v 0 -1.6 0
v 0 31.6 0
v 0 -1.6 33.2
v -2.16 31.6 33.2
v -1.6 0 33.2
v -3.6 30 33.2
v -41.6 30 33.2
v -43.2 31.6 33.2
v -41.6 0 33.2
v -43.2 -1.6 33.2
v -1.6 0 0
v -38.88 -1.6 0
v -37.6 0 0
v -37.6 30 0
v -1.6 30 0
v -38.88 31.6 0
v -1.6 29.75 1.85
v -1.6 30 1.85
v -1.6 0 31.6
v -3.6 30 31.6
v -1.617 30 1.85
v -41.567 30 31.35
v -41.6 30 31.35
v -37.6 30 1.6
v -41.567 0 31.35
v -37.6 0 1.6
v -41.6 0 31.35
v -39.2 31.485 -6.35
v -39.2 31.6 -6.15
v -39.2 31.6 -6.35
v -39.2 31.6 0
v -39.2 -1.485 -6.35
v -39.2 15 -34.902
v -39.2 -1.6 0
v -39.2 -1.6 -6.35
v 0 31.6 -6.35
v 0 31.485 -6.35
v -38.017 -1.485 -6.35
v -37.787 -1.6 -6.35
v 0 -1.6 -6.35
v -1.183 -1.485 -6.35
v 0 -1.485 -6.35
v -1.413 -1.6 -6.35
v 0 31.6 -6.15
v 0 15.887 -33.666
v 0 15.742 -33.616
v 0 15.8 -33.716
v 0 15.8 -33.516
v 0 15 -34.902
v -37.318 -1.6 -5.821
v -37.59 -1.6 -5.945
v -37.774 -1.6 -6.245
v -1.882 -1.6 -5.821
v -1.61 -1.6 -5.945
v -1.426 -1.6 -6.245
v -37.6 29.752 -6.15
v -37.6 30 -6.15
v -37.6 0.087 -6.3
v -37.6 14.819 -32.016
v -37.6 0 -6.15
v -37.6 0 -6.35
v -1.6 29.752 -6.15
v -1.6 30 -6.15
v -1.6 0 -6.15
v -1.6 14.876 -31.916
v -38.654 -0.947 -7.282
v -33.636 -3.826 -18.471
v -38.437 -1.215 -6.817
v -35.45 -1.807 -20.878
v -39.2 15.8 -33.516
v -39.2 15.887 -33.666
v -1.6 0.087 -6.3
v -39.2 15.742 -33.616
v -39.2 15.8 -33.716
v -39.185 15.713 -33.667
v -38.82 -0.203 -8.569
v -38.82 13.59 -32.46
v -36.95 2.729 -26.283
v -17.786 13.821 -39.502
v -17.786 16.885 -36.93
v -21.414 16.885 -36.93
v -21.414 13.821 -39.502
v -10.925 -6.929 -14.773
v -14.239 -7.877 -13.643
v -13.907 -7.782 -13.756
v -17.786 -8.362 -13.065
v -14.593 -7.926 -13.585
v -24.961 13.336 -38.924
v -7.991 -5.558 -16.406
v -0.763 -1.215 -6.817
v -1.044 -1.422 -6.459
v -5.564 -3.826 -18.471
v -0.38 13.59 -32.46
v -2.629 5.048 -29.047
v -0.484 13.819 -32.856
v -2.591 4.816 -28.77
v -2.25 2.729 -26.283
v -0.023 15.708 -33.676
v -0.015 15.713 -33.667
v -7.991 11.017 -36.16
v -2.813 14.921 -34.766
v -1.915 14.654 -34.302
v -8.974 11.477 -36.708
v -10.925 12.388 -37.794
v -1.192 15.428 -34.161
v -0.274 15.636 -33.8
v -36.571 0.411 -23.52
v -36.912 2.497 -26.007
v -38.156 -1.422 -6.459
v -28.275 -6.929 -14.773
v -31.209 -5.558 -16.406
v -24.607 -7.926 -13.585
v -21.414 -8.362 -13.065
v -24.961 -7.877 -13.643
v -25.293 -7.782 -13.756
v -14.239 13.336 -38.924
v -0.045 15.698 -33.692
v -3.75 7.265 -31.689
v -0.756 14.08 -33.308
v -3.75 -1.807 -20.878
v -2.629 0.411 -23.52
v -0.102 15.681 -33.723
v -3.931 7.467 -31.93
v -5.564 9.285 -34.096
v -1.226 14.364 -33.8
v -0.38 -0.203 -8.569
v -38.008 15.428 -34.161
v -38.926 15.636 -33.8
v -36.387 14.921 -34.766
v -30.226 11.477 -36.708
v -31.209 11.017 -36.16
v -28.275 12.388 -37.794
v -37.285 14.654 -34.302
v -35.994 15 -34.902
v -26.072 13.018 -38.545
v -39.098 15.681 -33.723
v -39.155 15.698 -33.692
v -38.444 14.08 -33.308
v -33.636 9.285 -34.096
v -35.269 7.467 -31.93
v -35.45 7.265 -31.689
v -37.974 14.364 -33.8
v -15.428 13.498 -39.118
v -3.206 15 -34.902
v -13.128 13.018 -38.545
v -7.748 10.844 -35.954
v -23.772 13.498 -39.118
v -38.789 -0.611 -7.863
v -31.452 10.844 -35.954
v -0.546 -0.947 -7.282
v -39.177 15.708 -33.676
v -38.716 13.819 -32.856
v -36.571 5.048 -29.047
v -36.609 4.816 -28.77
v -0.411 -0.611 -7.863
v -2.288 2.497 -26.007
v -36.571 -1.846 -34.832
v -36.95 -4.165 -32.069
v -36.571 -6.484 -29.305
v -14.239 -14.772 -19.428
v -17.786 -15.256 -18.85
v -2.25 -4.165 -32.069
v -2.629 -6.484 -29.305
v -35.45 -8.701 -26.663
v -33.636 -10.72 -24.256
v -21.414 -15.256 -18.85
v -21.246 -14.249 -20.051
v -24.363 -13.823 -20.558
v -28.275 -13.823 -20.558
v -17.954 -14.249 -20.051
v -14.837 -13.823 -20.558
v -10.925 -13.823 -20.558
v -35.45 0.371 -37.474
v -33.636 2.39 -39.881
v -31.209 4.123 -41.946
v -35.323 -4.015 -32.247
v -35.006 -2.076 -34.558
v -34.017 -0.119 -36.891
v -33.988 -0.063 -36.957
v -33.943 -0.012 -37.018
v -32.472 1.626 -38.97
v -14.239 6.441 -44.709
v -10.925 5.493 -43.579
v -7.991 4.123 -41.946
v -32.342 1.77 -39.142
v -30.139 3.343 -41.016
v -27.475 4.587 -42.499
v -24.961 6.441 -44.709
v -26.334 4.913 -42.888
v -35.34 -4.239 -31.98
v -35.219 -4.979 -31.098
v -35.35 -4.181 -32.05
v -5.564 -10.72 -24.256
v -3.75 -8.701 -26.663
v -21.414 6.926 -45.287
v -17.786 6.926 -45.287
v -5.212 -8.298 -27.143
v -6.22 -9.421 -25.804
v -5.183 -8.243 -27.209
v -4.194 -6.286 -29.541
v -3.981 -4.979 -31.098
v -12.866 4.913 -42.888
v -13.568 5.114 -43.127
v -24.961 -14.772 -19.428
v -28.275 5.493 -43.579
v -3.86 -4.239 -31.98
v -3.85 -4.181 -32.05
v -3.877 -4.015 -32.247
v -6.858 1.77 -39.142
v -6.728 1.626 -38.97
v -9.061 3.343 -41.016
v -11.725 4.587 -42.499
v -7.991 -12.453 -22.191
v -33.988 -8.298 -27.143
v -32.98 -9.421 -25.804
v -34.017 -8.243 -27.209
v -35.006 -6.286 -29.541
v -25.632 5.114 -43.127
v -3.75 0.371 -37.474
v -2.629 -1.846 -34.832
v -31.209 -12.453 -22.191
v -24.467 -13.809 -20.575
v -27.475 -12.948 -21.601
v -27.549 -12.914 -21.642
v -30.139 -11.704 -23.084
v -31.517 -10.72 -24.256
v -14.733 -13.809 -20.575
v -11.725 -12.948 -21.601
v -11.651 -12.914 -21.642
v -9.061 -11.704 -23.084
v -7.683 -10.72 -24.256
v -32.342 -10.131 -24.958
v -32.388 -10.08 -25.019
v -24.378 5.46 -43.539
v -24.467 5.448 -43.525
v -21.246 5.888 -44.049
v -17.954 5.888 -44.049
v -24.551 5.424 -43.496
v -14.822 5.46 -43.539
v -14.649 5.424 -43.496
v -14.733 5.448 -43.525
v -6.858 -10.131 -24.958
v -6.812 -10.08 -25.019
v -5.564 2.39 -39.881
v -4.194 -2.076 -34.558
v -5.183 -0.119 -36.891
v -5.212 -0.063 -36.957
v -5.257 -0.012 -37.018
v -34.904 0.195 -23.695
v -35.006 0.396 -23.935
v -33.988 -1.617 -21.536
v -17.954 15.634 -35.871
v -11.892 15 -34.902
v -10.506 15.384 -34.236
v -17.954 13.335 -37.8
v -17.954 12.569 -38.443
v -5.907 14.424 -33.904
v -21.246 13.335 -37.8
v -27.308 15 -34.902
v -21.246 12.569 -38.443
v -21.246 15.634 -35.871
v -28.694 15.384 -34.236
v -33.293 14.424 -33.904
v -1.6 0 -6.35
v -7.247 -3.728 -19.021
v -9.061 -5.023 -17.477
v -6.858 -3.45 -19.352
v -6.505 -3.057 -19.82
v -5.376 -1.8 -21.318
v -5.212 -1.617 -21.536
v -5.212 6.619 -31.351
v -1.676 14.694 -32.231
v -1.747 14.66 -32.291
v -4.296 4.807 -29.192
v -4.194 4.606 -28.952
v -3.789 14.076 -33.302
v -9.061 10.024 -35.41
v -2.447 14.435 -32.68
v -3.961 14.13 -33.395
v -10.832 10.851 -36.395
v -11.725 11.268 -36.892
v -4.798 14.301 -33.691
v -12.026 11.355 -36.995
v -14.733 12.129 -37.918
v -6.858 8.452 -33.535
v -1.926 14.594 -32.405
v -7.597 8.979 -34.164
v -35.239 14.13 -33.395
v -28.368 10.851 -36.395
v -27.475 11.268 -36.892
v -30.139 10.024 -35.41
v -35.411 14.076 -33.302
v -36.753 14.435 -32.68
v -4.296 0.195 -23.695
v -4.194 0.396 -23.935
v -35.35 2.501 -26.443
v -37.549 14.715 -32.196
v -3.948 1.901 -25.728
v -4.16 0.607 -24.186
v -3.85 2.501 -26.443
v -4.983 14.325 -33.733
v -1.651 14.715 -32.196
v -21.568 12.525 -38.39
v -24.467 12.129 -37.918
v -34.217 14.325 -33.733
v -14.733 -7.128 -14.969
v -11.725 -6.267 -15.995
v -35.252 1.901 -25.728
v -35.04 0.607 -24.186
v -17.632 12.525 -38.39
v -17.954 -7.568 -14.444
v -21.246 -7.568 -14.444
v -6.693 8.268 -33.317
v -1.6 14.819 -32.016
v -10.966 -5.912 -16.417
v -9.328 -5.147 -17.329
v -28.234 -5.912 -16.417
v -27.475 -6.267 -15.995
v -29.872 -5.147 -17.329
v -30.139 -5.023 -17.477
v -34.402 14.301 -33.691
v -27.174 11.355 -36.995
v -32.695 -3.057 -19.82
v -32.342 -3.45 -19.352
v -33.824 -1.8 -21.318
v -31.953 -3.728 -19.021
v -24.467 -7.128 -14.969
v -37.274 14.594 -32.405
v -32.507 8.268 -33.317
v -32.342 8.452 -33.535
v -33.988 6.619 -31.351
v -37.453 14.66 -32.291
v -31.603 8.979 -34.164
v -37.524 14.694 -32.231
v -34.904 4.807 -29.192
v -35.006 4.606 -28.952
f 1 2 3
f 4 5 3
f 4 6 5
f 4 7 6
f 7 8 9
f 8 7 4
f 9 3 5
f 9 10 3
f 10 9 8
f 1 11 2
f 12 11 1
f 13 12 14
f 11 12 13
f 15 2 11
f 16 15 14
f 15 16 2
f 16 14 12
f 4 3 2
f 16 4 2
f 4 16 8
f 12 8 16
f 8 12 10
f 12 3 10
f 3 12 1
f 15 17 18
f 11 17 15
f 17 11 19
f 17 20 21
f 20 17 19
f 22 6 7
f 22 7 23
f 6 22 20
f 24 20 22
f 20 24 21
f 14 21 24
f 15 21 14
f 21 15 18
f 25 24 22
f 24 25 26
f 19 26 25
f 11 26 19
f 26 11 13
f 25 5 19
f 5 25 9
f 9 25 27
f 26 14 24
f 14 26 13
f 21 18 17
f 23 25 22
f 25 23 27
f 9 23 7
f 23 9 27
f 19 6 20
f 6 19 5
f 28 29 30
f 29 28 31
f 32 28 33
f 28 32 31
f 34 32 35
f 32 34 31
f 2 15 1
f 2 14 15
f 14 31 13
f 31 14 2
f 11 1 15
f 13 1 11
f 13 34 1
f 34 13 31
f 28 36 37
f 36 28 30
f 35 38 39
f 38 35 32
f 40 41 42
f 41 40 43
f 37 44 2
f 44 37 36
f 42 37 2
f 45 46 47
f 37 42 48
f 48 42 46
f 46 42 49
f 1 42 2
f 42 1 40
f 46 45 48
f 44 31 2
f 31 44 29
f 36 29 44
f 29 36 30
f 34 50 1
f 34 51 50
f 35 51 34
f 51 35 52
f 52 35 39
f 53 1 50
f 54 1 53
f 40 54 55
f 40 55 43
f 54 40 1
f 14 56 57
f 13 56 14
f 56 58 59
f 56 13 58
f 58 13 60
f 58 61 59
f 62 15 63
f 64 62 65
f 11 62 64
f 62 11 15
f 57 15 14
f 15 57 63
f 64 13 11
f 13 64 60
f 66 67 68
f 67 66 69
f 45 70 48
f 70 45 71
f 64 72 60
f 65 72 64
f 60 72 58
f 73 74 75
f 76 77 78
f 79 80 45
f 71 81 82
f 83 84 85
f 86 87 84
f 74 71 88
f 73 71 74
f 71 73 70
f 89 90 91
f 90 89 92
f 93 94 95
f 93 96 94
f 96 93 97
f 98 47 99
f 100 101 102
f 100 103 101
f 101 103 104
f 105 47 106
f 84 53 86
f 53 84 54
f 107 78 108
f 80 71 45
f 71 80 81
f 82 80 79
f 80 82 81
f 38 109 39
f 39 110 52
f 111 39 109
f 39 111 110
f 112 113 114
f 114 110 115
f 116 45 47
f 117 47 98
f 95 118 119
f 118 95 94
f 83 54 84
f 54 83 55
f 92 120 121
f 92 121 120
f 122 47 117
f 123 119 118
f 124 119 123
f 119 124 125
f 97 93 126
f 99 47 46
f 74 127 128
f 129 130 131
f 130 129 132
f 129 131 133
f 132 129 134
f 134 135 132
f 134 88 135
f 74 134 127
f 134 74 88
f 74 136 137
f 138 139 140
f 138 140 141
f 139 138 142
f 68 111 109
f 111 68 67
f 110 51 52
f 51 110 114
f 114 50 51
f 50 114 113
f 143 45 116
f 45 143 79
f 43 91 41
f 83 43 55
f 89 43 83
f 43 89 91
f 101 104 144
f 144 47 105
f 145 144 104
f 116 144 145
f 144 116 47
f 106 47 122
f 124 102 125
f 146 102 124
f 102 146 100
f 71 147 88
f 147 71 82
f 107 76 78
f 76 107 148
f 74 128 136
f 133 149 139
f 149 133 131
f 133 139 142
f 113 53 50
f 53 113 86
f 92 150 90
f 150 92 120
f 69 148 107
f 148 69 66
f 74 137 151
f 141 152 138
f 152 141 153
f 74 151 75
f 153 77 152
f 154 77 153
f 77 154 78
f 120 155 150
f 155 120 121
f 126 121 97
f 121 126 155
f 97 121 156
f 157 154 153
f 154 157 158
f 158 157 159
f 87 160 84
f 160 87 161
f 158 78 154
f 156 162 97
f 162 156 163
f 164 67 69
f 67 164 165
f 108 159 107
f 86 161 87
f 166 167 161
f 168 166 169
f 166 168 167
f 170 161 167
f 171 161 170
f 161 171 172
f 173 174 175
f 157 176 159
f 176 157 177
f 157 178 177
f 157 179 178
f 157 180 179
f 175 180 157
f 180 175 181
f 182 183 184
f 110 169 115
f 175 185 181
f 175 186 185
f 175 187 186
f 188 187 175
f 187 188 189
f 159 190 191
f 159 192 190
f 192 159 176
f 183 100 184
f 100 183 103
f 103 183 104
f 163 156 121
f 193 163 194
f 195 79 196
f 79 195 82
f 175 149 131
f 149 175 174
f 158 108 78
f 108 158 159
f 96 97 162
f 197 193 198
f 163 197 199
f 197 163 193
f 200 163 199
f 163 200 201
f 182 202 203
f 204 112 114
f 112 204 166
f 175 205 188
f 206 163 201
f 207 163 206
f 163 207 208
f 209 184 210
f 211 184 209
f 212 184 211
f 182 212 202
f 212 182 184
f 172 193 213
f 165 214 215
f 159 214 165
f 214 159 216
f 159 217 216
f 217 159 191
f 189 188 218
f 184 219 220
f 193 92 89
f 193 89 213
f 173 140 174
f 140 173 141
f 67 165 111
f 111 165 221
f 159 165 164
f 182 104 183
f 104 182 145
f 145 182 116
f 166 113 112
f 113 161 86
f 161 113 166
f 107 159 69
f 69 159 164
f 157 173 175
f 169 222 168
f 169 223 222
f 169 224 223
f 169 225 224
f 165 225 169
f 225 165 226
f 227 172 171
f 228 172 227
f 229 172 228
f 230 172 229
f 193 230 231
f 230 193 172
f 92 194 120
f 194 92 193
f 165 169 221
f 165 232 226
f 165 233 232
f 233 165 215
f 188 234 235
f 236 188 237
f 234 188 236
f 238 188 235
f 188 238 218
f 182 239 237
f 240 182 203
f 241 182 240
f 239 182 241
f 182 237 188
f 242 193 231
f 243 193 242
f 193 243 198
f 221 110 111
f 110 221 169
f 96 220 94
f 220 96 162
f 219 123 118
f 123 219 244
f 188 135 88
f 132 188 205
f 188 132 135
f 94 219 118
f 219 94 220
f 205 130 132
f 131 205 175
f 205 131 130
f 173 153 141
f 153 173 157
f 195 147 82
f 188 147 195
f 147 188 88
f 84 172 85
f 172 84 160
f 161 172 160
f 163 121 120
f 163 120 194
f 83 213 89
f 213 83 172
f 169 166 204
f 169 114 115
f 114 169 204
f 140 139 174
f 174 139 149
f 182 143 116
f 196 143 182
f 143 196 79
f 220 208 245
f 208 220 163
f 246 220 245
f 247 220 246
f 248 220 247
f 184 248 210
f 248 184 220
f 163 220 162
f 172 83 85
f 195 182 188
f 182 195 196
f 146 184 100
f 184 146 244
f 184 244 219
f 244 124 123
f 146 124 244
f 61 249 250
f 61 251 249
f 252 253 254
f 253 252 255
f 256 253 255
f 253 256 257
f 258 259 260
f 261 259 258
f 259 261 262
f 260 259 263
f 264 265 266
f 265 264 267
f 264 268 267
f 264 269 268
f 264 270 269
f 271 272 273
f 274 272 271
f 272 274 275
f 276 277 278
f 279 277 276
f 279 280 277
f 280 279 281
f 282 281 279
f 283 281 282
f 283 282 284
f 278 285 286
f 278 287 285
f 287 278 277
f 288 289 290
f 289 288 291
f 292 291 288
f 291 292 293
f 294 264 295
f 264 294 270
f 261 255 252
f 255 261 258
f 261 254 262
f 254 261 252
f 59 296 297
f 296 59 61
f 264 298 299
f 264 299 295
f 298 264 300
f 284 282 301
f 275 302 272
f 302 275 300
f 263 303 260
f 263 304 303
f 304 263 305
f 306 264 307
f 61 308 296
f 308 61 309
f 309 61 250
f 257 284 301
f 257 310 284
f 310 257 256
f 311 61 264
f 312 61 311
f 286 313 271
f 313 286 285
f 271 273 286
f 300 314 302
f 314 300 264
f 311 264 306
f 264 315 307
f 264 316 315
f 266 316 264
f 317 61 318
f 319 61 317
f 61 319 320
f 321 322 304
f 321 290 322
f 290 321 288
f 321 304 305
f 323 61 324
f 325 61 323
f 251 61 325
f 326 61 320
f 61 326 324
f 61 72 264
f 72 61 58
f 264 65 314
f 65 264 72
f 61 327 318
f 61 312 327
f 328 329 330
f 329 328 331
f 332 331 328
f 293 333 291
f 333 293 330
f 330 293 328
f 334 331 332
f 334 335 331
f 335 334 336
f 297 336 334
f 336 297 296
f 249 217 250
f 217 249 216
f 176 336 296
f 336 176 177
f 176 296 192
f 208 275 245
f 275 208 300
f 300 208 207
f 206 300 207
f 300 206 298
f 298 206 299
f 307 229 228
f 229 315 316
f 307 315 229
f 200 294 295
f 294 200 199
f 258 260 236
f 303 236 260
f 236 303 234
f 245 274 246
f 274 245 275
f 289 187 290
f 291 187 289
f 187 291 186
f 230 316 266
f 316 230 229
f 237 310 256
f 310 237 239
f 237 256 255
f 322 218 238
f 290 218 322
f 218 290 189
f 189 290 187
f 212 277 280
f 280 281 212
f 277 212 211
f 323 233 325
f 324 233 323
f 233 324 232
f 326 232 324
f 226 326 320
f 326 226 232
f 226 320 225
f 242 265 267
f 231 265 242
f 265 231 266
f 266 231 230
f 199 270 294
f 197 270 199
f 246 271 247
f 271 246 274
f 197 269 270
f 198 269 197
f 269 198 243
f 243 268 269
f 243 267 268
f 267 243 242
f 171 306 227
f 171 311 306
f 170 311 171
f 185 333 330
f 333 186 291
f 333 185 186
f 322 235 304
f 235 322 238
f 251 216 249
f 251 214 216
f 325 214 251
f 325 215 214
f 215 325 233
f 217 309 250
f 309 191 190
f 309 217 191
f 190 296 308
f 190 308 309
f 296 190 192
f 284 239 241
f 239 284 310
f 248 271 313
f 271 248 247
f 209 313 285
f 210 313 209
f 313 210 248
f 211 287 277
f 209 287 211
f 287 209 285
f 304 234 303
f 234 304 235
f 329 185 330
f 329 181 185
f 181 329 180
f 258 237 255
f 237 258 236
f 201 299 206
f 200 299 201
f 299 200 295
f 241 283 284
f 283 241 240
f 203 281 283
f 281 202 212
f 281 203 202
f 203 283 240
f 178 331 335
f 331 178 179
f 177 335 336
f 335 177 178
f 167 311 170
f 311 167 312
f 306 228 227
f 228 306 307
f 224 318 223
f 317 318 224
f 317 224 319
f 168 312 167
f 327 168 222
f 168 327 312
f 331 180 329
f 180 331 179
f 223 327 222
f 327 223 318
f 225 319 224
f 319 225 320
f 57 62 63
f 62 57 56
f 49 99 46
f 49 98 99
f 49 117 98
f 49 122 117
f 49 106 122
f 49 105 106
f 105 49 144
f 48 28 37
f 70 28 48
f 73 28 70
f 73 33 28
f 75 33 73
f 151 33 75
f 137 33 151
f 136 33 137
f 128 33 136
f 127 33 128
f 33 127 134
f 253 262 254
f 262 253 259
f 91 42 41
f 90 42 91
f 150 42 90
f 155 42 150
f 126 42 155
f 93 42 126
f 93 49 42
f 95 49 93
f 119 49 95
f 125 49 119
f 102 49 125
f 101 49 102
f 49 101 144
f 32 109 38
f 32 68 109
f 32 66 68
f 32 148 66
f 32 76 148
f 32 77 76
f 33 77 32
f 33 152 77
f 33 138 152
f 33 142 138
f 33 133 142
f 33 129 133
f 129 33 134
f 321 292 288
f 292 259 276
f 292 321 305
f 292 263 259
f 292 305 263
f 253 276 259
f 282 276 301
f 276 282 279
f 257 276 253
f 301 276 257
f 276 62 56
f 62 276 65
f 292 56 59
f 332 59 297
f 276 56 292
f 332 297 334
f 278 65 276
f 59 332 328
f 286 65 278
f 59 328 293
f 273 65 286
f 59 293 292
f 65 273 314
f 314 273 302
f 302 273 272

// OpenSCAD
// Cat Food Adaptor

echo(version=version());
// Values are in millimeters

$fs=0.5;
extruder_width = 0.4;
// wall_thickness = (2*extruder_width)*2;
wall_thickness = (4*extruder_width);


// Female connection to splitter output

// Need not a cube; 
/*
  Basically this:
    +---------+
    |          \
    |           \
    +------------+
*/

// This makes the right side one.
module inside_lip() {
  hull() { // I likely need to rearrange the points in each face, but wrapping in hull also works…
  // FIXME: stop hull here.
    polyhedron(points=[
      [0,0,0],    // 0
      [36,0,0],   // 1
      [36,30,0],  // 2
      [0,30,0],   // 3
      [0,0,30],   // 4
      [40,0,30],  // 5
      [40,30,30], // 6
      [2,30,30],  // 7
    ], faces=[
      [0,1,2,3],  // top
      [0,1,5,4],  // front
      [0,4,7,3],  // left
      [1,2,6,5], // right
      [2,3,7,6], // back
      [4,5,6,7],  // bottom
    ]);
  }
}

module shoot_collar(wall=wall_thickness) {
  difference() {
    // gonna try resize, otherwise will need another polyhedron.
    resize(newsize=[40+wall*2,30+wall*2,30+wall*2]) inside_lip();
    translate([wall, wall, wall]) {
      inside_lip();
    }
    translate([wall, wall, -0.25]) {
      cube([36,30, wall+0.5]);
    }
    translate([wall, wall, 30+wall-0.25]) {
      linear_extrude(height=wall+1) {
        polygon(points=[
          [0,0],   // 4
          [40,0],  // 5
          [40,30], // 6
          [2,30],  // 7
        ]);
      }
    }
  }
}

module shoot_extention(wall=wall_thickness, h=5) {
  difference() {
    cube([36 + wall*2, 30 + wall*2, h]);
    translate([wall, wall, -0.25]) {
      cube([36, 30, h+wall]);
    }
  }
}

module from_shoot_to_pipe_inside(wall=wall_thickness) {
  outside=38.1;
  inside=34.7;
  // wall=1.76;
  hull() {
    linear_extrude(height=0.1) {
      polygon(points=[
          [0,0],    // 0
          [36,0],   // 1
          [36,30],  // 2
          [0,30],   // 3
      ]);
    }
    rotate([10, 0, 0]) {
      translate([36/2, 30/2 +2, -11]) {
        cylinder(d=inside-wall*2, h=4);
      }
    }
  }
  rotate([10, 0, 0]) {
    translate([36/2, 30/2 +2, -20]) {
      cylinder(d=inside-wall*2, h=10);
    }
  }
}
module from_shoot_to_pipe_outside(wall=wall_thickness) {
  outside=38.1;
  inside=34.7;
  // wall=1.76;
  px=36+wall*2;
  py=30+wall*2;
  hull() {
    linear_extrude(height=0.1) {
      polygon(points=[
          [0,0],    // 0
          [px,0],   // 1
          [px,py],  // 2
          [0,py],   // 3
      ]);
    }
    rotate([10, 0, 0]) {
      translate([px/2, py/2 +2, -11]) {
        cylinder(d=inside, h=4);
      }
    }
  }
  rotate([10, 0, 0]) {
    translate([px/2, py/2 +2, -20]) {
      cylinder(d=inside, h=10);
    }
  }
}
module from_shoot_to_pipe(wall=wall_thickness) {
  // TODO: clean this up into a single module?
  difference() {
    from_shoot_to_pipe_outside(wall);
    translate([wall, wall, 0]) {
      from_shoot_to_pipe_inside(wall);
    }
  }
}

module bend(wall=wall_thickness, width=36, height=30) {
  // each side should be height, angle is 60º, so…
  side=height + wall*2;
  mid_h=sin(60) * side;
  difference() {
    linear_extrude(height=width+wall*2) {
      polygon(points=[[0,0],[mid_h,side/2],[0,side]]);
    }
    translate([wall, 0, wall]) {
      cube([side, side, width]);
    }
  }
}

// So maybe it would work out better to not go pipe until after the bend.  And do the bend bit as a drop
// TODO: Remember to mirror() to fit on left side of splitter.

module cat_food_adaptor_right() {
  panel_extention=6.35; // ¼in

  translate([0,-wall_thickness,0]) {
    shoot_collar();
  }
  translate([0, 0, -panel_extention]) {
    translate([0,-wall_thickness, 0]) {
      shoot_extention(h=6.35);
    }
    rotate([300, 0, 0]) {
      translate([0, -wall_thickness, 0]) {
        from_shoot_to_pipe();
      }
    }
    translate([0, 30+wall_thickness, 0.2]) {
      rotate([0, 90, 0]) {
        rotate([0, 0, -120]) {
          bend();
        }
      }
    }
  }
}

// cat_food_adaptor_right();

mirror([1, 0, 0]) {
  cat_food_adaptor_right();
}
